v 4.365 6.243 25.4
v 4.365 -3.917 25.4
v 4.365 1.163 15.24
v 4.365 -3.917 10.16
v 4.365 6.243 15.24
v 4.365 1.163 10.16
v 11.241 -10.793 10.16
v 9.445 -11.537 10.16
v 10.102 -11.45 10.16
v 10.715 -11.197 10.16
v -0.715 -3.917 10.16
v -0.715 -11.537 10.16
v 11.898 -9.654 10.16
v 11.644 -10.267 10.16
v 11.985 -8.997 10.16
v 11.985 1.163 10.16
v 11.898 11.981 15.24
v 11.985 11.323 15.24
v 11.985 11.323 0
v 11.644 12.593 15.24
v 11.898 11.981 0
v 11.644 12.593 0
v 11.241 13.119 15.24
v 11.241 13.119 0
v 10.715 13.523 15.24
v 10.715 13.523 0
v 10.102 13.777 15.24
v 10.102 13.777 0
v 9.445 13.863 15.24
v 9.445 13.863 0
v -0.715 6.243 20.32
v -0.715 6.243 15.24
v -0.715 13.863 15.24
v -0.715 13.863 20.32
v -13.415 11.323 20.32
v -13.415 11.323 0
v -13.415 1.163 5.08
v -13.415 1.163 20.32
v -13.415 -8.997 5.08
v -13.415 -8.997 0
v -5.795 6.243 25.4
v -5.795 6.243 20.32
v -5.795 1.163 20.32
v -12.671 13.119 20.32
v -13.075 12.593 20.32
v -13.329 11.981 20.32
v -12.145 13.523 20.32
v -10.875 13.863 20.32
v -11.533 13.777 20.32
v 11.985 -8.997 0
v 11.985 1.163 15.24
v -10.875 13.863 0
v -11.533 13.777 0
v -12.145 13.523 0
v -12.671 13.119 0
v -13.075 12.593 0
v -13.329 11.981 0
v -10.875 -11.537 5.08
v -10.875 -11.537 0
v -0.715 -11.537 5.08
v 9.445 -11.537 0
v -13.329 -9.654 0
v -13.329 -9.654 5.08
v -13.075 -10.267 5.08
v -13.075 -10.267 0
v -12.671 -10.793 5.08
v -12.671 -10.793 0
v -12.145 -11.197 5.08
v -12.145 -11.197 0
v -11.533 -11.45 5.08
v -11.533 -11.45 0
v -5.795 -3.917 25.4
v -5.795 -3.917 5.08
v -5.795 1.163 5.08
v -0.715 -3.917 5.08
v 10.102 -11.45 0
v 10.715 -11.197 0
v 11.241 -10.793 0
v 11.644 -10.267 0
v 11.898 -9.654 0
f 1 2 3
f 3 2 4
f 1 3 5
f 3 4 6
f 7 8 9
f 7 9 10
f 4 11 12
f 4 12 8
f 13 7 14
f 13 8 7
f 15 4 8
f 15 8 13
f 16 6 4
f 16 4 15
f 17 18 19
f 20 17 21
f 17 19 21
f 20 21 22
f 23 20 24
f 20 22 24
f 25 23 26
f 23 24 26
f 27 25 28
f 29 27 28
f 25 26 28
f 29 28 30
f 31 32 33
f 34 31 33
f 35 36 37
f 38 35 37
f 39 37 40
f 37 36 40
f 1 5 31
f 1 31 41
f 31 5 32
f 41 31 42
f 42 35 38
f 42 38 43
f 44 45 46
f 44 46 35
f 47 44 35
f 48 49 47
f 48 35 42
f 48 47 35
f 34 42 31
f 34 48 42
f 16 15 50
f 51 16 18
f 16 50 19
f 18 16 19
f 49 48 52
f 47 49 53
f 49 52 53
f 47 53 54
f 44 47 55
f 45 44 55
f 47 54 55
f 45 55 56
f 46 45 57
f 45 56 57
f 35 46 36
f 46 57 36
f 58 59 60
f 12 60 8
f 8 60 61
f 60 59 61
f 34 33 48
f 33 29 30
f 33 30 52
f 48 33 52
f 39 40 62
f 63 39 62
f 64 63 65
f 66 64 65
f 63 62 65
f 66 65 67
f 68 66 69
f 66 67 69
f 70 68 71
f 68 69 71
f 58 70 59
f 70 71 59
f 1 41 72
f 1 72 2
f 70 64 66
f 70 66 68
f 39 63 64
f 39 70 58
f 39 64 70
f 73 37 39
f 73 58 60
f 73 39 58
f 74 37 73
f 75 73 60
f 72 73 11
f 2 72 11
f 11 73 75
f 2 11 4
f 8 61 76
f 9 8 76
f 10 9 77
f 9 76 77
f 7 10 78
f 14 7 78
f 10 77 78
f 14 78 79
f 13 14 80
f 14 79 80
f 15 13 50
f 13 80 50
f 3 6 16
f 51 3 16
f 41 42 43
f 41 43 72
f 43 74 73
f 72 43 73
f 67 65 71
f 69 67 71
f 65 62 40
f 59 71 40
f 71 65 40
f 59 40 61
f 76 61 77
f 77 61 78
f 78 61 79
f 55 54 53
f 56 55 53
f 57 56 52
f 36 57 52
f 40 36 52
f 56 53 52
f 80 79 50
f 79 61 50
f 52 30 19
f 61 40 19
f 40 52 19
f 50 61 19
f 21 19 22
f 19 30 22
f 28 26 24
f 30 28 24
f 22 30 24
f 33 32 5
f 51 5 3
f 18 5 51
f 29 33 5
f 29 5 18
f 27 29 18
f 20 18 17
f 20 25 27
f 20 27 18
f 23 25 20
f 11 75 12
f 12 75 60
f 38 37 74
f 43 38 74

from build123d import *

# Parameters (mm, degrees)
F1_DEPTH = 20.32
F2_DEPTH = 15.24
F3_DEPTH = 25.4
F4_DEPTH = 10.16
F5_DEPTH = 5.08


with BuildPart() as f1:
    # F0 (on Top) → F1 (new body)
    with BuildSketch(Plane.XY):
        with BuildLine():
            Line((-0.715326, 13.86313), (-10.875326, 13.86313))
            ThreePointArc((-10.875326, 13.86313), (-12.671377, 13.119181), (-13.415326, 11.32313))
            Line((-13.415326, 11.32313), (-13.415326, 1.16313))
            Line((-13.415326, 1.16313), (-5.795326, 1.16313))
            Line((-5.795326, 1.16313), (-5.795326, 6.24313))
            Line((-5.795326, 6.24313), (-0.715326, 6.24313))
            Line((-0.715326, 6.24313), (-0.715326, 13.86313))
        make_face()
    extrude(amount=F1_DEPTH)

    # F0 (on Top) → F2 (join)
    with BuildSketch(Plane.XY):
        with BuildLine():
            Line((9.444674, 13.86313), (-0.715326, 13.86313))
            Line((-0.715326, 13.86313), (-0.715326, 6.24313))
            Line((-0.715326, 6.24313), (4.364674, 6.24313))
            Line((4.364674, 6.24313), (4.364674, 1.16313))
            Line((4.364674, 1.16313), (11.984674, 1.16313))
            Line((11.984674, 1.16313), (11.984674, 11.32313))
            ThreePointArc((11.984674, 11.32313), (11.240725, 13.119181), (9.444674, 13.86313))
        make_face()
    extrude(amount=F2_DEPTH)

    # F0 (on Top) → F3 (join)
    with BuildSketch(Plane.XY):
        Polygon((4.364674, 6.24313), (-0.715326, 6.24313), (-5.795326, 6.24313), (-5.795326, 1.16313), (-5.795326, -3.91687), (-0.715326, -3.91687), (4.364674, -3.91687), (4.364674, 1.16313), align=None)
    extrude(amount=F3_DEPTH)

    # F0 (on Top) → F4 (join)
    with BuildSketch(Plane.XY):
        with BuildLine():
            Line((11.984674, -8.99687), (11.984674, 1.16313))
            Line((11.984674, 1.16313), (4.364674, 1.16313))
            Line((4.364674, 1.16313), (4.364674, -3.91687))
            Line((4.364674, -3.91687), (-0.715326, -3.91687))
            Line((-0.715326, -3.91687), (-0.715326, -11.53687))
            Line((-0.715326, -11.53687), (9.444674, -11.53687))
            ThreePointArc((9.444674, -11.53687), (11.240725, -10.792922), (11.984674, -8.99687))
        make_face()
    extrude(amount=F4_DEPTH)

    # F0 (on Top) → F5 (join)
    with BuildSketch(Plane.XY):
        with BuildLine():
            Line((-5.795326, 1.16313), (-13.415326, 1.16313))
            Line((-13.415326, 1.16313), (-13.415326, -8.99687))
            ThreePointArc((-13.415326, -8.99687), (-12.671377, -10.792922), (-10.875326, -11.53687))
            Line((-10.875326, -11.53687), (-0.715326, -11.53687))
            Line((-0.715326, -11.53687), (-0.715326, -3.91687))
            Line((-0.715326, -3.91687), (-5.795326, -3.91687))
            Line((-5.795326, -3.91687), (-5.795326, 1.16313))
        make_face()
    extrude(amount=F5_DEPTH)


solid = f1.part
